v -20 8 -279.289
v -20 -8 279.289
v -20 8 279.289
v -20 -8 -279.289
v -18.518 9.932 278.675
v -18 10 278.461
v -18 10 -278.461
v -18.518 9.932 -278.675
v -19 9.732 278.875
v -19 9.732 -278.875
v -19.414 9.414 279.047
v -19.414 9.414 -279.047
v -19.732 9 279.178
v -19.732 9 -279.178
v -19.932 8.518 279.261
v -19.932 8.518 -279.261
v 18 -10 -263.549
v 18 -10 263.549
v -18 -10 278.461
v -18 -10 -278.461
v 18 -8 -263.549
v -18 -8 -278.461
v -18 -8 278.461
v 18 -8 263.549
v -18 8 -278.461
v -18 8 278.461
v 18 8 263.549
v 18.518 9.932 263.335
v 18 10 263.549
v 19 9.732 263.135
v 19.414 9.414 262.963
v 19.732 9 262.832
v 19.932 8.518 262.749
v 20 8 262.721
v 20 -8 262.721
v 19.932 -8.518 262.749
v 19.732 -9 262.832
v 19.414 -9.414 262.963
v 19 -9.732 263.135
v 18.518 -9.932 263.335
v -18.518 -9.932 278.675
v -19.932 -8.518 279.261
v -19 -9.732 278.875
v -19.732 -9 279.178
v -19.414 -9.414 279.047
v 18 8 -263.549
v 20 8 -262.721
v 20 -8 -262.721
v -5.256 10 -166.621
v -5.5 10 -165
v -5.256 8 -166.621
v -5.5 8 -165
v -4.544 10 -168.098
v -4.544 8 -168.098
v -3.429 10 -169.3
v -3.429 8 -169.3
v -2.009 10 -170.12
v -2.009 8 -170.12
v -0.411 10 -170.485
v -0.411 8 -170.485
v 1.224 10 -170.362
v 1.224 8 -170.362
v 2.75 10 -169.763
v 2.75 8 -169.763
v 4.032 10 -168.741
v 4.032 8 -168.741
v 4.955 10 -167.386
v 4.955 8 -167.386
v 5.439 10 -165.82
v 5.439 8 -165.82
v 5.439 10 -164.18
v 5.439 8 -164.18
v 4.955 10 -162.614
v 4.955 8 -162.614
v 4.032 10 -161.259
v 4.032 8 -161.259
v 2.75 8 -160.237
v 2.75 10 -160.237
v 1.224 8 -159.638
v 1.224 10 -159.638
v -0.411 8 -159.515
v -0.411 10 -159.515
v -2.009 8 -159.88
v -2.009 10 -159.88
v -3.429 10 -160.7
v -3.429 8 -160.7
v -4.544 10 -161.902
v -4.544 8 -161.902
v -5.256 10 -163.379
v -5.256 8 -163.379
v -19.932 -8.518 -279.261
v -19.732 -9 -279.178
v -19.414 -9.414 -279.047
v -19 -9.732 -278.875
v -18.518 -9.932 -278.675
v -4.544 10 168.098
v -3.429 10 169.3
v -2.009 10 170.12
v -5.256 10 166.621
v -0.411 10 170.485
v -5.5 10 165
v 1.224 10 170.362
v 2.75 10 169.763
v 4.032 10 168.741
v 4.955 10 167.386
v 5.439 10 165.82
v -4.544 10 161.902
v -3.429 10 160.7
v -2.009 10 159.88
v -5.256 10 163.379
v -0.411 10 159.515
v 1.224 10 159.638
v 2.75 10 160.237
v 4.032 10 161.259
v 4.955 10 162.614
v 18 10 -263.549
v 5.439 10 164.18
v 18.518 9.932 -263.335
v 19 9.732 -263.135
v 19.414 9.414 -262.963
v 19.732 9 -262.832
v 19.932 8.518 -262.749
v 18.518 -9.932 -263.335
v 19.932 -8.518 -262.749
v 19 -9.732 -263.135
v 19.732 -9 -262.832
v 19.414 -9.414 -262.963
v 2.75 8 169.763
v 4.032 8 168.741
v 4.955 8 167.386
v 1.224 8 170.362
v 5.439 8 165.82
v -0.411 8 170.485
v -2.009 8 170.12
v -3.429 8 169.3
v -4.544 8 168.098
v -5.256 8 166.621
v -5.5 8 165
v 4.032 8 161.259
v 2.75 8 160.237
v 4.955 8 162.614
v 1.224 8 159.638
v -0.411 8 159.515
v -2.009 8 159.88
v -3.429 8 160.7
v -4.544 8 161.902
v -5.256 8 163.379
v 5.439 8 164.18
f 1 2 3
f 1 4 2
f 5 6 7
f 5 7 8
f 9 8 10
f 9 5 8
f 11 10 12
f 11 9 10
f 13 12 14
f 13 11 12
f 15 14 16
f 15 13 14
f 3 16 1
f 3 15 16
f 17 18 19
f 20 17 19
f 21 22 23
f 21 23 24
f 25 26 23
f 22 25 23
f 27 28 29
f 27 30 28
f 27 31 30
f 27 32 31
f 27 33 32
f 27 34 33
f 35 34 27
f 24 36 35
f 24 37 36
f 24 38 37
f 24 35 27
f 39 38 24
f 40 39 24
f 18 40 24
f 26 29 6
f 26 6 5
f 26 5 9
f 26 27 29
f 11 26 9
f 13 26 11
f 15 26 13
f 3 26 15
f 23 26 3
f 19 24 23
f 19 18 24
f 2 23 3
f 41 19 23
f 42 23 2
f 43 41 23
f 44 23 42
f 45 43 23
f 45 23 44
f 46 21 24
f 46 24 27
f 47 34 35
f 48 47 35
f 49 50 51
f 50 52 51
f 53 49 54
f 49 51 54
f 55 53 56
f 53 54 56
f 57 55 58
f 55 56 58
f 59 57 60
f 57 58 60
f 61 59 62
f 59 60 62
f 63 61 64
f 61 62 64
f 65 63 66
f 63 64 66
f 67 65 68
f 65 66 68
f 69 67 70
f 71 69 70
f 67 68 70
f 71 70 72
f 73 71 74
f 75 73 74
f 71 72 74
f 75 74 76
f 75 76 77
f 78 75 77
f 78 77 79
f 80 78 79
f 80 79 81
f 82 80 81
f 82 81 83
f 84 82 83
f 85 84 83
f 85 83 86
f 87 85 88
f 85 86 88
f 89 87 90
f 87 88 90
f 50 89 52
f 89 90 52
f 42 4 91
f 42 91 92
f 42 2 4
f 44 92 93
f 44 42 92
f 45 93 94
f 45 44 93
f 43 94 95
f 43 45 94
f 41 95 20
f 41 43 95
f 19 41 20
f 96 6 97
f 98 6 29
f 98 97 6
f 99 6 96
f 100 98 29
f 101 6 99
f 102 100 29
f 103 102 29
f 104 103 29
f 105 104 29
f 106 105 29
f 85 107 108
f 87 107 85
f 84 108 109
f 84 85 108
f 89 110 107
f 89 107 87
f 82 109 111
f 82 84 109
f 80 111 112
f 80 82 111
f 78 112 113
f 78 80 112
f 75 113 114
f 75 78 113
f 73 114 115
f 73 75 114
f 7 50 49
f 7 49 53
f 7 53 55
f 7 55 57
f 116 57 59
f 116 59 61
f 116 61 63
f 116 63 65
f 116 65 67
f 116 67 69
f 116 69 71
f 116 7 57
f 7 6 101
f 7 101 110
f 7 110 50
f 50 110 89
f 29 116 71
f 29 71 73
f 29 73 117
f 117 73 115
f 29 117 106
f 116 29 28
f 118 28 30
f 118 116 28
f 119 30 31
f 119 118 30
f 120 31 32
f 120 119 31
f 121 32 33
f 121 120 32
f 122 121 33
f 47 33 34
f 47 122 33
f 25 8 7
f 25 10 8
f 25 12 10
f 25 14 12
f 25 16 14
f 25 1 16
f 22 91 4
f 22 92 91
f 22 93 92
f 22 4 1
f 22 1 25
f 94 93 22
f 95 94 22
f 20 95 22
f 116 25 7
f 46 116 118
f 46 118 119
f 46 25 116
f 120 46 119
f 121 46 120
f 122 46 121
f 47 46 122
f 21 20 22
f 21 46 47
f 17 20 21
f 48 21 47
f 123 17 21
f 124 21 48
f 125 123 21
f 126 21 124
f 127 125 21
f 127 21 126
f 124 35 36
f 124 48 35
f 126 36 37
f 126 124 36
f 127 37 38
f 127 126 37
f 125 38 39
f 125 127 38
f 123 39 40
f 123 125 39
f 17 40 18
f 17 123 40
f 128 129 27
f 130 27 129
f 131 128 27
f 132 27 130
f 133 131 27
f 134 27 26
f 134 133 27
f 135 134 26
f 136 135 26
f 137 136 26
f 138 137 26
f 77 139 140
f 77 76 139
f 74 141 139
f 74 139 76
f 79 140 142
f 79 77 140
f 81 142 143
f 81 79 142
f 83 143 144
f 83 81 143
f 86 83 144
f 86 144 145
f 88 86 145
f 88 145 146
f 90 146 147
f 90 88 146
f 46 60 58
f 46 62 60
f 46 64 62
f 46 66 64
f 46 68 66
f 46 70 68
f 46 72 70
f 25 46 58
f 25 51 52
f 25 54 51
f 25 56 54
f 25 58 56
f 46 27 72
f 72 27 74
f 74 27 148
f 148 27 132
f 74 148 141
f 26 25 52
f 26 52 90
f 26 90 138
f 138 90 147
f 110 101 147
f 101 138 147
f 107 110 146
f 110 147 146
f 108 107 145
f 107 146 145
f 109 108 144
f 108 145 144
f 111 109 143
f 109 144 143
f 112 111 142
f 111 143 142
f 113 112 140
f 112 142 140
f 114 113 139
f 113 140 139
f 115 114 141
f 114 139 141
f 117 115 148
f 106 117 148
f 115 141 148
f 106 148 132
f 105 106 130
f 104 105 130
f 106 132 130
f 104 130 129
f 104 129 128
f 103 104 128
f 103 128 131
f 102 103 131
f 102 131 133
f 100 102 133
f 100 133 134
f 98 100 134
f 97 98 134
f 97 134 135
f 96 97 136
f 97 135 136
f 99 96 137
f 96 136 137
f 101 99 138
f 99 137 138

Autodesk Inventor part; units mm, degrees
ref_plane "YZ Plane" through (0, 0, 0) normal (1, 0, 0) x (0, 1, 0)
ref_plane "XZ Plane" through (0, 0, 0) normal (0, 1, 0) x (-1, 0, 0)
ref_plane "XY Plane" through (0, 0, 0) normal (0, 0, 1) x (1, 0, 0)
sketch "Sketch1" plane through (0, 0, 0) normal (0, 0, 1) x (1, 0, 0)
  line L0 (-20, 10) -> (20, 10)
  line L1 (20, 10) -> (20, -10)
  line L2 (20, -10) -> (-20, -10)
  line L3 (-20, -10) -> (-20, 10)
  line L4 (-20, 10) -> (20, -10) construction
  line L5 (20, 10) -> (-20, -10) construction
  line L6 (18, 8) -> (-18, 8)
  line L7 (-18, 8) -> (-18, -8)
  line L8 (-18, -8) -> (18, -8)
  line L9 (18, -8) -> (18, 8)
  point P0 (0, 0)
  dimension "d0" = 40
  dimension "d1" = 20
  dimension "d2" = 2
extrude "Extrusion1" add sketch "Sketch1" along normal mid plane 700
sketch "Sketch2" plane through (0, 0, 0) normal (0, 1, 0) x (-1, 0, 0)
  line L0 (20, -350) -> (20, 350) projected
  line L1 (-20, 350) -> (20, 350)
  line L2 (-20, -350) -> (-20, 350) projected
  line L3 (20, -350) -> (-20, -350) projected
  line L4 (-20, -350) -> (-50.7107, -350)
  line L5 (-50.7107, -350) -> (-50.7107, 350)
  line L6 (-50.7107, 350) -> (-20, 350)
  line L7 (20, -279.2893) -> (-50.7107, -350)
  line L8 (20, -279.2893) -> (-20, -262.7208)
  line L9 (-20, -350) -> (-20, 350) projected
  point P0 (0, 0)
  point P1 (-20, -319.2893)
  dimension "d5" = 45
  dimension "d6" = 100
  dimension "d19" = 67.5
extrude "Extrusion2" cut sketch "Sketch2" along normal through all both and the other way through all contours L3 L2 L7 L0 | L7 L2 L8
mirror "Mirror1" about plane through (0, 0, 0) normal (0, 0, 1) of "Extrusion2"
sketch "Sketch3" plane through (0, 0, 0) normal (0, 1, 0) x (-1, 0, 0)
  line L0 (0, 0) -> (0, -271.0051) construction
  line L1 (-20, -262.7208) -> (-20, 262.7208) construction
  line L2 (20, 279.2893) -> (20, -279.2893) construction
  circle A0 centre (0, -165) radius 5.5
  line L3 (20, 279.2893) -> (20, -279.2893) construction
  line L4 (-20, -262.7208) -> (20, -279.2893) construction
  dimension "d10" = 11
  dimension "d20" = 165
extrude "Extrusion3" cut sketch "Sketch3" along normal through all
mirror "Mirror2" about plane through (0, 0, 0) normal (0, 0, 1) of "Extrusion3"
fillet "Fillet1" radius 2 4 edges at (-20, 10, 0) (-20, -10, 0) (20, -10, 0) (20, 10, 0)
equation "\"d19\" = 1.5 * d5"
properties part number "Long tube 1_CPY"
